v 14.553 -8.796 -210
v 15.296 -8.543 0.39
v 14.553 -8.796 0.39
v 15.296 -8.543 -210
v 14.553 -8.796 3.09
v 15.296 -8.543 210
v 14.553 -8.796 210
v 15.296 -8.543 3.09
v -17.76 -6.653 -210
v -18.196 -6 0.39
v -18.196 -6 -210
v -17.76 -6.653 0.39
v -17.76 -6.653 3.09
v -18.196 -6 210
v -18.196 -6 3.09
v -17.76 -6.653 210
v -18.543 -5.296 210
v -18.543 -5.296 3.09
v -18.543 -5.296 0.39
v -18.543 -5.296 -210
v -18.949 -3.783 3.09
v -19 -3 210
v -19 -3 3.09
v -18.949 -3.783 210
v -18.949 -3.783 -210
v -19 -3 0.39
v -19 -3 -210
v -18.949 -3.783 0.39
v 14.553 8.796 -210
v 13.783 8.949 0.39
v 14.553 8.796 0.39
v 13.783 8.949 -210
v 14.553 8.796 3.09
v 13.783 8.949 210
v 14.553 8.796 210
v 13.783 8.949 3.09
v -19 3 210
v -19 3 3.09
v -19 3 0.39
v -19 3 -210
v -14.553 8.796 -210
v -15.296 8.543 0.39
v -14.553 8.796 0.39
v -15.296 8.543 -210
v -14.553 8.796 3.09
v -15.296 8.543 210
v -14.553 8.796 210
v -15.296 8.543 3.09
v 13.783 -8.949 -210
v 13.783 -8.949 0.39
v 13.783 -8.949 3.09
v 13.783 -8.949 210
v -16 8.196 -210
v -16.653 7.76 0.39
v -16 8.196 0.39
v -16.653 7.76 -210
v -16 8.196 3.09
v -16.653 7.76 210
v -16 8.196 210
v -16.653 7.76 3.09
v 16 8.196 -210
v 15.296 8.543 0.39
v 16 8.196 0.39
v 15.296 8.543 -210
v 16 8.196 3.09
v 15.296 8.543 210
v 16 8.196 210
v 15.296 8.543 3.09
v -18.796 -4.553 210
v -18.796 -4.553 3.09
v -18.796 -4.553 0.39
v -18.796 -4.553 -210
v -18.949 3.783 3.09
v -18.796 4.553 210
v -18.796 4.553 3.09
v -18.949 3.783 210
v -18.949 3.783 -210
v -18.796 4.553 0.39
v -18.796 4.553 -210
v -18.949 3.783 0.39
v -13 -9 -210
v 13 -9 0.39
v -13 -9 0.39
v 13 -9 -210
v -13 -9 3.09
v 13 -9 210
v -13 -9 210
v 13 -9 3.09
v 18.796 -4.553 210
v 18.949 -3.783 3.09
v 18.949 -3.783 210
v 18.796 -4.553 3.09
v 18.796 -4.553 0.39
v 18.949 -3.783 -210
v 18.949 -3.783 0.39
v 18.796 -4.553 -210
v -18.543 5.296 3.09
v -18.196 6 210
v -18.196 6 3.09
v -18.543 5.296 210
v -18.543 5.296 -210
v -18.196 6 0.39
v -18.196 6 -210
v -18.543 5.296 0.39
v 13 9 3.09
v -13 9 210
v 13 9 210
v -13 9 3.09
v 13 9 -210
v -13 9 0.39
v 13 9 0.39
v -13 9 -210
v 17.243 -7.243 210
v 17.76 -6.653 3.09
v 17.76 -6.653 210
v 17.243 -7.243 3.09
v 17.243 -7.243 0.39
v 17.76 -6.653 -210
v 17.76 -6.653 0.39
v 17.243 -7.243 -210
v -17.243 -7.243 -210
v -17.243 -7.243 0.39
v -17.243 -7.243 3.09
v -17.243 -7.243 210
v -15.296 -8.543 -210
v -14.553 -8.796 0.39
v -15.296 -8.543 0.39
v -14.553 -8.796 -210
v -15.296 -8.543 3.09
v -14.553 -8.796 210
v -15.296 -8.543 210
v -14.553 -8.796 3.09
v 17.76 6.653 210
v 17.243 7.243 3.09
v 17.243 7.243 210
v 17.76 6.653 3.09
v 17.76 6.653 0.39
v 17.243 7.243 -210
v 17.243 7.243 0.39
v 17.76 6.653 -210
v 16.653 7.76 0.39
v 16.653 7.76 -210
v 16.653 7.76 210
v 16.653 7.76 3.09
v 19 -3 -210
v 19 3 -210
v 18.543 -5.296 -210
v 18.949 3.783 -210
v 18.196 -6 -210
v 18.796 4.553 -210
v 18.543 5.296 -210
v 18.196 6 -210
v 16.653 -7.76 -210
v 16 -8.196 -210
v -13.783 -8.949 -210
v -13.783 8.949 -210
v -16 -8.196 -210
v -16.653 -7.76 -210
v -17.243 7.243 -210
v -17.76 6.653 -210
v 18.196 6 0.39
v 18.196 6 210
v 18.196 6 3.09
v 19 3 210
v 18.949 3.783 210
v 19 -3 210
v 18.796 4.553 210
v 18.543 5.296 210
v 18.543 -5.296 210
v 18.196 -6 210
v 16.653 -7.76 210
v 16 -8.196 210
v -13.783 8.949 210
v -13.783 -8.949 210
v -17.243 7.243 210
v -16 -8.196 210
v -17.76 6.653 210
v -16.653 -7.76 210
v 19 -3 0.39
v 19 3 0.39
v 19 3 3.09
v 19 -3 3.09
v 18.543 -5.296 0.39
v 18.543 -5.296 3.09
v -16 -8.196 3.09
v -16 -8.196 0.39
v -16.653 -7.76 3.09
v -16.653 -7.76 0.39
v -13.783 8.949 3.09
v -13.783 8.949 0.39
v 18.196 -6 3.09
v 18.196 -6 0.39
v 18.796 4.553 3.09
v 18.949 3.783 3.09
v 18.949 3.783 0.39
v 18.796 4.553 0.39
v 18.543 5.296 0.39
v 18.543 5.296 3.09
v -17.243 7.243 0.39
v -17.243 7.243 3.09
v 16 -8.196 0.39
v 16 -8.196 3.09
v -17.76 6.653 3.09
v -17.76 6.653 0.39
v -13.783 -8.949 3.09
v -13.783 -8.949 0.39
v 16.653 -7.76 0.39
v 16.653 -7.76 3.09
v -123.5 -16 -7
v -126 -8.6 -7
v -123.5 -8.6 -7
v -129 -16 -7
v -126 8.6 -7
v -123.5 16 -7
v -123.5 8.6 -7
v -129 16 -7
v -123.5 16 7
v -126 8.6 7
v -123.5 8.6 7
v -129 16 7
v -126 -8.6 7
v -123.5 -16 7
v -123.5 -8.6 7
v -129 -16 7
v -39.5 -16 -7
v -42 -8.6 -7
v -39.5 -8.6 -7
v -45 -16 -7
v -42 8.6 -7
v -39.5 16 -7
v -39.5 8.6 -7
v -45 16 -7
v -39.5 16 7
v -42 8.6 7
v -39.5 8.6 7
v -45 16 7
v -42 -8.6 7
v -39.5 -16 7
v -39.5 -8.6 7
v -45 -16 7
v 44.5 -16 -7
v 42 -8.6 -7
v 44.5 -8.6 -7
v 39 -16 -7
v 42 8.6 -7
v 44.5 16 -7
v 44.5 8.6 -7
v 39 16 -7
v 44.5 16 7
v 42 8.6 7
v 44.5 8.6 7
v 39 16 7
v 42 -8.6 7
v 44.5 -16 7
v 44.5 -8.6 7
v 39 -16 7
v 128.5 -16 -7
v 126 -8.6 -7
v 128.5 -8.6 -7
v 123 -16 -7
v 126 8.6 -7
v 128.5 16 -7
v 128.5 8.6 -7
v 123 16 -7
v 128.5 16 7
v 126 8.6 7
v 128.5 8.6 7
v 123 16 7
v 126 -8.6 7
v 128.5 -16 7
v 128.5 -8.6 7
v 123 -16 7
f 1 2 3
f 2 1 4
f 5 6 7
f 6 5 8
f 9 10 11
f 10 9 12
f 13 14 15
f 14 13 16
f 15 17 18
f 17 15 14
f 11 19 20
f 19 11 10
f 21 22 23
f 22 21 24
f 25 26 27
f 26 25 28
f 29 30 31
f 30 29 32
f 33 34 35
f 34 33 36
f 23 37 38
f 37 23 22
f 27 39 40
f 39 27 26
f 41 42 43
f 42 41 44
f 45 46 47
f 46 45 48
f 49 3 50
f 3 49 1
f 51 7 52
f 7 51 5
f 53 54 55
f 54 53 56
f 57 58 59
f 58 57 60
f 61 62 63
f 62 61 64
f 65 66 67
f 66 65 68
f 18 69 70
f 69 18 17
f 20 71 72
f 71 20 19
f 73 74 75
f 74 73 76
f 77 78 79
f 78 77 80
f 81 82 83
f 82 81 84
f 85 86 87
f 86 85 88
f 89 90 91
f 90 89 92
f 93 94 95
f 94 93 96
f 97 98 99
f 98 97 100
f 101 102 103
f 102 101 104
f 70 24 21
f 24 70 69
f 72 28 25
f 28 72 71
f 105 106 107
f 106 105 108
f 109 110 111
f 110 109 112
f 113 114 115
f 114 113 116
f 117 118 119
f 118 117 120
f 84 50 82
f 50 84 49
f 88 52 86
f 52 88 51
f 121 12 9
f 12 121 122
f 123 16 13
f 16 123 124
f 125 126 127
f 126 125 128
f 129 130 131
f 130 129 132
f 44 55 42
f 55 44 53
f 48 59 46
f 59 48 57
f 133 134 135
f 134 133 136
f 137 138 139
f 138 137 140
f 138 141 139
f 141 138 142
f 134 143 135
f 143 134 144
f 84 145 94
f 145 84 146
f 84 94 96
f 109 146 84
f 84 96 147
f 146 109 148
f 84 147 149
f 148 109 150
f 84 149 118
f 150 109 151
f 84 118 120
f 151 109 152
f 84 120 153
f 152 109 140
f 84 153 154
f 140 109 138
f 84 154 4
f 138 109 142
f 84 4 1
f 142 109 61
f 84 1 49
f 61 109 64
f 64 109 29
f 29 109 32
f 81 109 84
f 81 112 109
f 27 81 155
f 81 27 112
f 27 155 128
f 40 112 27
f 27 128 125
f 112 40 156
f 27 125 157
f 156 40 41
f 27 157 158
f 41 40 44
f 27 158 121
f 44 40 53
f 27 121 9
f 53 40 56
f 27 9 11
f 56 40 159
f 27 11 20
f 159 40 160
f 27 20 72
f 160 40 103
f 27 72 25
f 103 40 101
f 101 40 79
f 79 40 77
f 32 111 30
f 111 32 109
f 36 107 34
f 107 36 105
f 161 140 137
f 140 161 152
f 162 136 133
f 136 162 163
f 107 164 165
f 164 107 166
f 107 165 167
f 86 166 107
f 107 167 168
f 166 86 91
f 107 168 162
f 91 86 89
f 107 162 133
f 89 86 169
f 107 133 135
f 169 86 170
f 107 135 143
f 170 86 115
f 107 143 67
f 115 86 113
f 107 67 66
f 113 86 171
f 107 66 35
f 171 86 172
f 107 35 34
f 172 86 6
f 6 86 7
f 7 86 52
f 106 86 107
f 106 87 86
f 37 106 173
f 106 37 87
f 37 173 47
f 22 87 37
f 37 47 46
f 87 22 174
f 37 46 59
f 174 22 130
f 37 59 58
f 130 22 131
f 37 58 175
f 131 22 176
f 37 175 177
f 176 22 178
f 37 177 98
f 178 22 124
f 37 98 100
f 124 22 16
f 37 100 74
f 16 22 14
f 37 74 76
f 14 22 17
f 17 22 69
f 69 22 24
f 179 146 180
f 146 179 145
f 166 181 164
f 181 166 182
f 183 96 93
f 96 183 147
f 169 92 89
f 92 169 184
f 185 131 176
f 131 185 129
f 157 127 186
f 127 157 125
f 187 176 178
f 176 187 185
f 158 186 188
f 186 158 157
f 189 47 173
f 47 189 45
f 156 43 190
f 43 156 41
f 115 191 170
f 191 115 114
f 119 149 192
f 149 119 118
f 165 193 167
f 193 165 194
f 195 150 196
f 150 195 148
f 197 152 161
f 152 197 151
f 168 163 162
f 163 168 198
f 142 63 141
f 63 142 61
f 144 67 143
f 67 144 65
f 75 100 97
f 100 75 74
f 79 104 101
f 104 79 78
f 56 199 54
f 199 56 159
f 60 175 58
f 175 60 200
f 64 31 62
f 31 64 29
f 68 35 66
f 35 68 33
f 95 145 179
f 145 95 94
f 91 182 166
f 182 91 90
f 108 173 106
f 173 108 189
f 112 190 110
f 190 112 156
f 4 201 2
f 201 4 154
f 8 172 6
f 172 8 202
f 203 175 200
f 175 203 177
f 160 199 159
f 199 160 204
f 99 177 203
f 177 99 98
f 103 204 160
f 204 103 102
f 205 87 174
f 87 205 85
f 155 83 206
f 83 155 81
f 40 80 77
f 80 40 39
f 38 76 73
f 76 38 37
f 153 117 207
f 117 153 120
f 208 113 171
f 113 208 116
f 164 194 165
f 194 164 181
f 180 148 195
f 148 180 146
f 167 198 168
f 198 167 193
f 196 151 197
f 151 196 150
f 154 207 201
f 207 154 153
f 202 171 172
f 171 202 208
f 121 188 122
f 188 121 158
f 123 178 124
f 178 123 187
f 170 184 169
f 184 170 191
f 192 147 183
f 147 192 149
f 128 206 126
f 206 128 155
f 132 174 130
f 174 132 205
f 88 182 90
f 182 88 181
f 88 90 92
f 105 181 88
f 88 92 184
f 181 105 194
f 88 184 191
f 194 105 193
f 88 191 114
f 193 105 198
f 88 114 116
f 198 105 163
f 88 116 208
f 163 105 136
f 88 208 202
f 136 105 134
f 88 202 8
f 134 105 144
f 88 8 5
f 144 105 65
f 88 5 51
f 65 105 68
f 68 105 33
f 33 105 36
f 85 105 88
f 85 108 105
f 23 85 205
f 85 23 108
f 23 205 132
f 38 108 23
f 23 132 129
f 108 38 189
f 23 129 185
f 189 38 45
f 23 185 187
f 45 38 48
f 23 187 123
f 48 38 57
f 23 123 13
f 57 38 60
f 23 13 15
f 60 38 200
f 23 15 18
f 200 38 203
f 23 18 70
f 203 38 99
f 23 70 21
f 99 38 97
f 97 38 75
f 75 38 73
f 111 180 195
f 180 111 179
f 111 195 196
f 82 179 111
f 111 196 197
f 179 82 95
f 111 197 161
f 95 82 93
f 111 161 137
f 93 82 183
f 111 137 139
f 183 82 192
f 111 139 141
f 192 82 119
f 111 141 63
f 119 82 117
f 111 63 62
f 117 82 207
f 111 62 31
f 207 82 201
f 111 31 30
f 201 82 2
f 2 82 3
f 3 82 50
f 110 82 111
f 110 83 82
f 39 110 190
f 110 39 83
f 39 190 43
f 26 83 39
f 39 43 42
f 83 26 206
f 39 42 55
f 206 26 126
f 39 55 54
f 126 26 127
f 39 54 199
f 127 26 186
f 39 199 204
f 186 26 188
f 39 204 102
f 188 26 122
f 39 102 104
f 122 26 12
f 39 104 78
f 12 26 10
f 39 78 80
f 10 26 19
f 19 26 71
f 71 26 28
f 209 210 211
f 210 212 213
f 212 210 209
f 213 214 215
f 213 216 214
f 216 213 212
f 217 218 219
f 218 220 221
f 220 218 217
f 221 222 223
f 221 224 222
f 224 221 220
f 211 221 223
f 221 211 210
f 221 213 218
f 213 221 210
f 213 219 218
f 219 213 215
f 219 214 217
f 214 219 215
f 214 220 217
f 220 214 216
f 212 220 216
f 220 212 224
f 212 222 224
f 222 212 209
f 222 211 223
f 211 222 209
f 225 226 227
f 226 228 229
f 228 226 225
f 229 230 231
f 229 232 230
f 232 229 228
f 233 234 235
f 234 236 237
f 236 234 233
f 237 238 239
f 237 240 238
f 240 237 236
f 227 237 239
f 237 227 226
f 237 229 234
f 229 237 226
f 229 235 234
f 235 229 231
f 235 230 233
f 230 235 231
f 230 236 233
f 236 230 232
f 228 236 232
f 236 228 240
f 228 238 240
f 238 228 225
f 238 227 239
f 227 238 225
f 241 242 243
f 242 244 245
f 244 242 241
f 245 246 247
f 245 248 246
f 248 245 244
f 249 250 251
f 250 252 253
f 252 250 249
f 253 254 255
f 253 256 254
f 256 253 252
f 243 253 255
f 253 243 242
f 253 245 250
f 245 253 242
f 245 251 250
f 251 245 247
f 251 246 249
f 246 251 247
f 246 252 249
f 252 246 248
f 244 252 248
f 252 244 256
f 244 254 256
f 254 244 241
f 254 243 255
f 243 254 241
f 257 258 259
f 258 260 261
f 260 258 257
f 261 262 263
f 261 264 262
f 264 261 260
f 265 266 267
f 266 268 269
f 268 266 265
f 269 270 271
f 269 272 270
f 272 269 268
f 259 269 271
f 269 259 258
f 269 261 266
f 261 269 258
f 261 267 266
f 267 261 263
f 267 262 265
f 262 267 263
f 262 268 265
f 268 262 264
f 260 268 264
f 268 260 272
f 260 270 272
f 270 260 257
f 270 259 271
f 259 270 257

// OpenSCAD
// 2018 Ford Transit Connect — clip-on "new-look" grille overlay.
// Pleading Sanity / P.S Studio · Shane Cooper · 17 Nov 2026
//
// A horizontal trim bar that clips OVER your existing upper-grille slats
// (no screws, no drilling), with a recessed blank badge mount in the centre.
// Fit your own legally-obtained badge for the modern coast-to-coast look.
//
// FIT CHECK FIRST: measure your grille, edit the parameters below, print a
// single test clip (set clip_count=1) to check the grip on one slat before
// printing the full bar.
//
// MATERIAL: PETG or ASA only — NOT PLA. PLA softens in a hot grille/sun and
// will warp. 0.2mm layers, 4 perimeters, 30% infill, supports under hooks.
//
// TRADEMARK: no Ford logo/badge is included — the centre recess is blank.

$fn = 48;

// ---- MEASURE YOUR GRILLE AND EDIT THESE ----
bar_length     = 420;   // mm — total width (measure upper grille opening)
bar_height     = 38;    // mm — vertical height of trim bar
bar_thickness  = 6;     // mm — depth, sits off grille face
slat_thickness = 4;     // mm — thickness of grille slat the clips grip
slat_lip       = 3;     // mm — hook lip that grabs behind the slat
clip_gap       = 0.4;   // mm — push-fit clearance
clip_count     = 4;     // number of C-clips, evenly spaced along the bar
clip_width     = 14;    // mm — width of each C-clip
badge_w        = 90;    // mm — centre badge recess width (measure your badge)
badge_h        = 45;    // mm — centre badge recess height
badge_d        = 2.5;   // mm — recess depth (badge sits inset)
corner_r       = 6;     // mm — rounded bar corners
// --------------------------------------------

grip = slat_thickness + clip_gap; // total gap inside the C

// ---- Main trim bar (rounded, along X), with centre badge pocket ----
module bar() {
  difference() {
    // rounded bar body: hull of 4 corner cylinders, extruded along X
    linear_extrude(bar_length, center=true)
    hull() {
      for (dy = [-bar_height/2 + corner_r, bar_height/2 - corner_r])
        for (dz = [-bar_thickness/2 + corner_r, bar_thickness/2 - corner_r])
          translate([dy, dz]) circle(r=corner_r);
    }
    // badge pocket on the front face (+Z side), centre, not through-hole
    translate([0, 0, bar_thickness/2 - badge_d/2 - 0.01])
    cube([badge_w, badge_h, badge_d + 0.2], center=true);
  }
}

// ---- One C-clip, centred at X=0, gripping a slat of thickness `grip` ----
// Profile (Y,Z): back plate at -bar_thickness/2, hooks reach toward grille.
module cclip() {
  y0 = -bar_height/2 + 3;          // bottom of back plate
  y1 =  bar_height/2 - 3;          // top of back plate
  z_back = -bar_thickness/2;       // back plate face (toward grille)
  z_front = bar_thickness/2 - 0.5; // front of back plate (bonded to bar)
  linear_extrude(clip_width, center=true)
  polygon(points=[
    // back plate
    [z_back,  y0],
    [z_back,  y1],
    [z_front, y1],
    // upper hook: forward, then inward (grips top of slat)
    [z_front, y1 - slat_lip - grip],
    [z_back + slat_lip, y1 - slat_lip - grip],
    [z_back + slat_lip, y0 + slat_lip + grip],
    [z_front, y0 + slat_lip + grip],
    // lower hook
    [z_front, y0],
  ]);
}

bar();

// Bond C-clips to the back of the bar, evenly spaced along X
spacing = bar_length / (clip_count + 1);
for (i = [1:clip_count]) {
  x = -bar_length/2 + i * spacing;
  translate([x, 0, 0]) cclip();
}

// Print hint: orient bar flat on bed (X-Y), clips point up; use supports.
